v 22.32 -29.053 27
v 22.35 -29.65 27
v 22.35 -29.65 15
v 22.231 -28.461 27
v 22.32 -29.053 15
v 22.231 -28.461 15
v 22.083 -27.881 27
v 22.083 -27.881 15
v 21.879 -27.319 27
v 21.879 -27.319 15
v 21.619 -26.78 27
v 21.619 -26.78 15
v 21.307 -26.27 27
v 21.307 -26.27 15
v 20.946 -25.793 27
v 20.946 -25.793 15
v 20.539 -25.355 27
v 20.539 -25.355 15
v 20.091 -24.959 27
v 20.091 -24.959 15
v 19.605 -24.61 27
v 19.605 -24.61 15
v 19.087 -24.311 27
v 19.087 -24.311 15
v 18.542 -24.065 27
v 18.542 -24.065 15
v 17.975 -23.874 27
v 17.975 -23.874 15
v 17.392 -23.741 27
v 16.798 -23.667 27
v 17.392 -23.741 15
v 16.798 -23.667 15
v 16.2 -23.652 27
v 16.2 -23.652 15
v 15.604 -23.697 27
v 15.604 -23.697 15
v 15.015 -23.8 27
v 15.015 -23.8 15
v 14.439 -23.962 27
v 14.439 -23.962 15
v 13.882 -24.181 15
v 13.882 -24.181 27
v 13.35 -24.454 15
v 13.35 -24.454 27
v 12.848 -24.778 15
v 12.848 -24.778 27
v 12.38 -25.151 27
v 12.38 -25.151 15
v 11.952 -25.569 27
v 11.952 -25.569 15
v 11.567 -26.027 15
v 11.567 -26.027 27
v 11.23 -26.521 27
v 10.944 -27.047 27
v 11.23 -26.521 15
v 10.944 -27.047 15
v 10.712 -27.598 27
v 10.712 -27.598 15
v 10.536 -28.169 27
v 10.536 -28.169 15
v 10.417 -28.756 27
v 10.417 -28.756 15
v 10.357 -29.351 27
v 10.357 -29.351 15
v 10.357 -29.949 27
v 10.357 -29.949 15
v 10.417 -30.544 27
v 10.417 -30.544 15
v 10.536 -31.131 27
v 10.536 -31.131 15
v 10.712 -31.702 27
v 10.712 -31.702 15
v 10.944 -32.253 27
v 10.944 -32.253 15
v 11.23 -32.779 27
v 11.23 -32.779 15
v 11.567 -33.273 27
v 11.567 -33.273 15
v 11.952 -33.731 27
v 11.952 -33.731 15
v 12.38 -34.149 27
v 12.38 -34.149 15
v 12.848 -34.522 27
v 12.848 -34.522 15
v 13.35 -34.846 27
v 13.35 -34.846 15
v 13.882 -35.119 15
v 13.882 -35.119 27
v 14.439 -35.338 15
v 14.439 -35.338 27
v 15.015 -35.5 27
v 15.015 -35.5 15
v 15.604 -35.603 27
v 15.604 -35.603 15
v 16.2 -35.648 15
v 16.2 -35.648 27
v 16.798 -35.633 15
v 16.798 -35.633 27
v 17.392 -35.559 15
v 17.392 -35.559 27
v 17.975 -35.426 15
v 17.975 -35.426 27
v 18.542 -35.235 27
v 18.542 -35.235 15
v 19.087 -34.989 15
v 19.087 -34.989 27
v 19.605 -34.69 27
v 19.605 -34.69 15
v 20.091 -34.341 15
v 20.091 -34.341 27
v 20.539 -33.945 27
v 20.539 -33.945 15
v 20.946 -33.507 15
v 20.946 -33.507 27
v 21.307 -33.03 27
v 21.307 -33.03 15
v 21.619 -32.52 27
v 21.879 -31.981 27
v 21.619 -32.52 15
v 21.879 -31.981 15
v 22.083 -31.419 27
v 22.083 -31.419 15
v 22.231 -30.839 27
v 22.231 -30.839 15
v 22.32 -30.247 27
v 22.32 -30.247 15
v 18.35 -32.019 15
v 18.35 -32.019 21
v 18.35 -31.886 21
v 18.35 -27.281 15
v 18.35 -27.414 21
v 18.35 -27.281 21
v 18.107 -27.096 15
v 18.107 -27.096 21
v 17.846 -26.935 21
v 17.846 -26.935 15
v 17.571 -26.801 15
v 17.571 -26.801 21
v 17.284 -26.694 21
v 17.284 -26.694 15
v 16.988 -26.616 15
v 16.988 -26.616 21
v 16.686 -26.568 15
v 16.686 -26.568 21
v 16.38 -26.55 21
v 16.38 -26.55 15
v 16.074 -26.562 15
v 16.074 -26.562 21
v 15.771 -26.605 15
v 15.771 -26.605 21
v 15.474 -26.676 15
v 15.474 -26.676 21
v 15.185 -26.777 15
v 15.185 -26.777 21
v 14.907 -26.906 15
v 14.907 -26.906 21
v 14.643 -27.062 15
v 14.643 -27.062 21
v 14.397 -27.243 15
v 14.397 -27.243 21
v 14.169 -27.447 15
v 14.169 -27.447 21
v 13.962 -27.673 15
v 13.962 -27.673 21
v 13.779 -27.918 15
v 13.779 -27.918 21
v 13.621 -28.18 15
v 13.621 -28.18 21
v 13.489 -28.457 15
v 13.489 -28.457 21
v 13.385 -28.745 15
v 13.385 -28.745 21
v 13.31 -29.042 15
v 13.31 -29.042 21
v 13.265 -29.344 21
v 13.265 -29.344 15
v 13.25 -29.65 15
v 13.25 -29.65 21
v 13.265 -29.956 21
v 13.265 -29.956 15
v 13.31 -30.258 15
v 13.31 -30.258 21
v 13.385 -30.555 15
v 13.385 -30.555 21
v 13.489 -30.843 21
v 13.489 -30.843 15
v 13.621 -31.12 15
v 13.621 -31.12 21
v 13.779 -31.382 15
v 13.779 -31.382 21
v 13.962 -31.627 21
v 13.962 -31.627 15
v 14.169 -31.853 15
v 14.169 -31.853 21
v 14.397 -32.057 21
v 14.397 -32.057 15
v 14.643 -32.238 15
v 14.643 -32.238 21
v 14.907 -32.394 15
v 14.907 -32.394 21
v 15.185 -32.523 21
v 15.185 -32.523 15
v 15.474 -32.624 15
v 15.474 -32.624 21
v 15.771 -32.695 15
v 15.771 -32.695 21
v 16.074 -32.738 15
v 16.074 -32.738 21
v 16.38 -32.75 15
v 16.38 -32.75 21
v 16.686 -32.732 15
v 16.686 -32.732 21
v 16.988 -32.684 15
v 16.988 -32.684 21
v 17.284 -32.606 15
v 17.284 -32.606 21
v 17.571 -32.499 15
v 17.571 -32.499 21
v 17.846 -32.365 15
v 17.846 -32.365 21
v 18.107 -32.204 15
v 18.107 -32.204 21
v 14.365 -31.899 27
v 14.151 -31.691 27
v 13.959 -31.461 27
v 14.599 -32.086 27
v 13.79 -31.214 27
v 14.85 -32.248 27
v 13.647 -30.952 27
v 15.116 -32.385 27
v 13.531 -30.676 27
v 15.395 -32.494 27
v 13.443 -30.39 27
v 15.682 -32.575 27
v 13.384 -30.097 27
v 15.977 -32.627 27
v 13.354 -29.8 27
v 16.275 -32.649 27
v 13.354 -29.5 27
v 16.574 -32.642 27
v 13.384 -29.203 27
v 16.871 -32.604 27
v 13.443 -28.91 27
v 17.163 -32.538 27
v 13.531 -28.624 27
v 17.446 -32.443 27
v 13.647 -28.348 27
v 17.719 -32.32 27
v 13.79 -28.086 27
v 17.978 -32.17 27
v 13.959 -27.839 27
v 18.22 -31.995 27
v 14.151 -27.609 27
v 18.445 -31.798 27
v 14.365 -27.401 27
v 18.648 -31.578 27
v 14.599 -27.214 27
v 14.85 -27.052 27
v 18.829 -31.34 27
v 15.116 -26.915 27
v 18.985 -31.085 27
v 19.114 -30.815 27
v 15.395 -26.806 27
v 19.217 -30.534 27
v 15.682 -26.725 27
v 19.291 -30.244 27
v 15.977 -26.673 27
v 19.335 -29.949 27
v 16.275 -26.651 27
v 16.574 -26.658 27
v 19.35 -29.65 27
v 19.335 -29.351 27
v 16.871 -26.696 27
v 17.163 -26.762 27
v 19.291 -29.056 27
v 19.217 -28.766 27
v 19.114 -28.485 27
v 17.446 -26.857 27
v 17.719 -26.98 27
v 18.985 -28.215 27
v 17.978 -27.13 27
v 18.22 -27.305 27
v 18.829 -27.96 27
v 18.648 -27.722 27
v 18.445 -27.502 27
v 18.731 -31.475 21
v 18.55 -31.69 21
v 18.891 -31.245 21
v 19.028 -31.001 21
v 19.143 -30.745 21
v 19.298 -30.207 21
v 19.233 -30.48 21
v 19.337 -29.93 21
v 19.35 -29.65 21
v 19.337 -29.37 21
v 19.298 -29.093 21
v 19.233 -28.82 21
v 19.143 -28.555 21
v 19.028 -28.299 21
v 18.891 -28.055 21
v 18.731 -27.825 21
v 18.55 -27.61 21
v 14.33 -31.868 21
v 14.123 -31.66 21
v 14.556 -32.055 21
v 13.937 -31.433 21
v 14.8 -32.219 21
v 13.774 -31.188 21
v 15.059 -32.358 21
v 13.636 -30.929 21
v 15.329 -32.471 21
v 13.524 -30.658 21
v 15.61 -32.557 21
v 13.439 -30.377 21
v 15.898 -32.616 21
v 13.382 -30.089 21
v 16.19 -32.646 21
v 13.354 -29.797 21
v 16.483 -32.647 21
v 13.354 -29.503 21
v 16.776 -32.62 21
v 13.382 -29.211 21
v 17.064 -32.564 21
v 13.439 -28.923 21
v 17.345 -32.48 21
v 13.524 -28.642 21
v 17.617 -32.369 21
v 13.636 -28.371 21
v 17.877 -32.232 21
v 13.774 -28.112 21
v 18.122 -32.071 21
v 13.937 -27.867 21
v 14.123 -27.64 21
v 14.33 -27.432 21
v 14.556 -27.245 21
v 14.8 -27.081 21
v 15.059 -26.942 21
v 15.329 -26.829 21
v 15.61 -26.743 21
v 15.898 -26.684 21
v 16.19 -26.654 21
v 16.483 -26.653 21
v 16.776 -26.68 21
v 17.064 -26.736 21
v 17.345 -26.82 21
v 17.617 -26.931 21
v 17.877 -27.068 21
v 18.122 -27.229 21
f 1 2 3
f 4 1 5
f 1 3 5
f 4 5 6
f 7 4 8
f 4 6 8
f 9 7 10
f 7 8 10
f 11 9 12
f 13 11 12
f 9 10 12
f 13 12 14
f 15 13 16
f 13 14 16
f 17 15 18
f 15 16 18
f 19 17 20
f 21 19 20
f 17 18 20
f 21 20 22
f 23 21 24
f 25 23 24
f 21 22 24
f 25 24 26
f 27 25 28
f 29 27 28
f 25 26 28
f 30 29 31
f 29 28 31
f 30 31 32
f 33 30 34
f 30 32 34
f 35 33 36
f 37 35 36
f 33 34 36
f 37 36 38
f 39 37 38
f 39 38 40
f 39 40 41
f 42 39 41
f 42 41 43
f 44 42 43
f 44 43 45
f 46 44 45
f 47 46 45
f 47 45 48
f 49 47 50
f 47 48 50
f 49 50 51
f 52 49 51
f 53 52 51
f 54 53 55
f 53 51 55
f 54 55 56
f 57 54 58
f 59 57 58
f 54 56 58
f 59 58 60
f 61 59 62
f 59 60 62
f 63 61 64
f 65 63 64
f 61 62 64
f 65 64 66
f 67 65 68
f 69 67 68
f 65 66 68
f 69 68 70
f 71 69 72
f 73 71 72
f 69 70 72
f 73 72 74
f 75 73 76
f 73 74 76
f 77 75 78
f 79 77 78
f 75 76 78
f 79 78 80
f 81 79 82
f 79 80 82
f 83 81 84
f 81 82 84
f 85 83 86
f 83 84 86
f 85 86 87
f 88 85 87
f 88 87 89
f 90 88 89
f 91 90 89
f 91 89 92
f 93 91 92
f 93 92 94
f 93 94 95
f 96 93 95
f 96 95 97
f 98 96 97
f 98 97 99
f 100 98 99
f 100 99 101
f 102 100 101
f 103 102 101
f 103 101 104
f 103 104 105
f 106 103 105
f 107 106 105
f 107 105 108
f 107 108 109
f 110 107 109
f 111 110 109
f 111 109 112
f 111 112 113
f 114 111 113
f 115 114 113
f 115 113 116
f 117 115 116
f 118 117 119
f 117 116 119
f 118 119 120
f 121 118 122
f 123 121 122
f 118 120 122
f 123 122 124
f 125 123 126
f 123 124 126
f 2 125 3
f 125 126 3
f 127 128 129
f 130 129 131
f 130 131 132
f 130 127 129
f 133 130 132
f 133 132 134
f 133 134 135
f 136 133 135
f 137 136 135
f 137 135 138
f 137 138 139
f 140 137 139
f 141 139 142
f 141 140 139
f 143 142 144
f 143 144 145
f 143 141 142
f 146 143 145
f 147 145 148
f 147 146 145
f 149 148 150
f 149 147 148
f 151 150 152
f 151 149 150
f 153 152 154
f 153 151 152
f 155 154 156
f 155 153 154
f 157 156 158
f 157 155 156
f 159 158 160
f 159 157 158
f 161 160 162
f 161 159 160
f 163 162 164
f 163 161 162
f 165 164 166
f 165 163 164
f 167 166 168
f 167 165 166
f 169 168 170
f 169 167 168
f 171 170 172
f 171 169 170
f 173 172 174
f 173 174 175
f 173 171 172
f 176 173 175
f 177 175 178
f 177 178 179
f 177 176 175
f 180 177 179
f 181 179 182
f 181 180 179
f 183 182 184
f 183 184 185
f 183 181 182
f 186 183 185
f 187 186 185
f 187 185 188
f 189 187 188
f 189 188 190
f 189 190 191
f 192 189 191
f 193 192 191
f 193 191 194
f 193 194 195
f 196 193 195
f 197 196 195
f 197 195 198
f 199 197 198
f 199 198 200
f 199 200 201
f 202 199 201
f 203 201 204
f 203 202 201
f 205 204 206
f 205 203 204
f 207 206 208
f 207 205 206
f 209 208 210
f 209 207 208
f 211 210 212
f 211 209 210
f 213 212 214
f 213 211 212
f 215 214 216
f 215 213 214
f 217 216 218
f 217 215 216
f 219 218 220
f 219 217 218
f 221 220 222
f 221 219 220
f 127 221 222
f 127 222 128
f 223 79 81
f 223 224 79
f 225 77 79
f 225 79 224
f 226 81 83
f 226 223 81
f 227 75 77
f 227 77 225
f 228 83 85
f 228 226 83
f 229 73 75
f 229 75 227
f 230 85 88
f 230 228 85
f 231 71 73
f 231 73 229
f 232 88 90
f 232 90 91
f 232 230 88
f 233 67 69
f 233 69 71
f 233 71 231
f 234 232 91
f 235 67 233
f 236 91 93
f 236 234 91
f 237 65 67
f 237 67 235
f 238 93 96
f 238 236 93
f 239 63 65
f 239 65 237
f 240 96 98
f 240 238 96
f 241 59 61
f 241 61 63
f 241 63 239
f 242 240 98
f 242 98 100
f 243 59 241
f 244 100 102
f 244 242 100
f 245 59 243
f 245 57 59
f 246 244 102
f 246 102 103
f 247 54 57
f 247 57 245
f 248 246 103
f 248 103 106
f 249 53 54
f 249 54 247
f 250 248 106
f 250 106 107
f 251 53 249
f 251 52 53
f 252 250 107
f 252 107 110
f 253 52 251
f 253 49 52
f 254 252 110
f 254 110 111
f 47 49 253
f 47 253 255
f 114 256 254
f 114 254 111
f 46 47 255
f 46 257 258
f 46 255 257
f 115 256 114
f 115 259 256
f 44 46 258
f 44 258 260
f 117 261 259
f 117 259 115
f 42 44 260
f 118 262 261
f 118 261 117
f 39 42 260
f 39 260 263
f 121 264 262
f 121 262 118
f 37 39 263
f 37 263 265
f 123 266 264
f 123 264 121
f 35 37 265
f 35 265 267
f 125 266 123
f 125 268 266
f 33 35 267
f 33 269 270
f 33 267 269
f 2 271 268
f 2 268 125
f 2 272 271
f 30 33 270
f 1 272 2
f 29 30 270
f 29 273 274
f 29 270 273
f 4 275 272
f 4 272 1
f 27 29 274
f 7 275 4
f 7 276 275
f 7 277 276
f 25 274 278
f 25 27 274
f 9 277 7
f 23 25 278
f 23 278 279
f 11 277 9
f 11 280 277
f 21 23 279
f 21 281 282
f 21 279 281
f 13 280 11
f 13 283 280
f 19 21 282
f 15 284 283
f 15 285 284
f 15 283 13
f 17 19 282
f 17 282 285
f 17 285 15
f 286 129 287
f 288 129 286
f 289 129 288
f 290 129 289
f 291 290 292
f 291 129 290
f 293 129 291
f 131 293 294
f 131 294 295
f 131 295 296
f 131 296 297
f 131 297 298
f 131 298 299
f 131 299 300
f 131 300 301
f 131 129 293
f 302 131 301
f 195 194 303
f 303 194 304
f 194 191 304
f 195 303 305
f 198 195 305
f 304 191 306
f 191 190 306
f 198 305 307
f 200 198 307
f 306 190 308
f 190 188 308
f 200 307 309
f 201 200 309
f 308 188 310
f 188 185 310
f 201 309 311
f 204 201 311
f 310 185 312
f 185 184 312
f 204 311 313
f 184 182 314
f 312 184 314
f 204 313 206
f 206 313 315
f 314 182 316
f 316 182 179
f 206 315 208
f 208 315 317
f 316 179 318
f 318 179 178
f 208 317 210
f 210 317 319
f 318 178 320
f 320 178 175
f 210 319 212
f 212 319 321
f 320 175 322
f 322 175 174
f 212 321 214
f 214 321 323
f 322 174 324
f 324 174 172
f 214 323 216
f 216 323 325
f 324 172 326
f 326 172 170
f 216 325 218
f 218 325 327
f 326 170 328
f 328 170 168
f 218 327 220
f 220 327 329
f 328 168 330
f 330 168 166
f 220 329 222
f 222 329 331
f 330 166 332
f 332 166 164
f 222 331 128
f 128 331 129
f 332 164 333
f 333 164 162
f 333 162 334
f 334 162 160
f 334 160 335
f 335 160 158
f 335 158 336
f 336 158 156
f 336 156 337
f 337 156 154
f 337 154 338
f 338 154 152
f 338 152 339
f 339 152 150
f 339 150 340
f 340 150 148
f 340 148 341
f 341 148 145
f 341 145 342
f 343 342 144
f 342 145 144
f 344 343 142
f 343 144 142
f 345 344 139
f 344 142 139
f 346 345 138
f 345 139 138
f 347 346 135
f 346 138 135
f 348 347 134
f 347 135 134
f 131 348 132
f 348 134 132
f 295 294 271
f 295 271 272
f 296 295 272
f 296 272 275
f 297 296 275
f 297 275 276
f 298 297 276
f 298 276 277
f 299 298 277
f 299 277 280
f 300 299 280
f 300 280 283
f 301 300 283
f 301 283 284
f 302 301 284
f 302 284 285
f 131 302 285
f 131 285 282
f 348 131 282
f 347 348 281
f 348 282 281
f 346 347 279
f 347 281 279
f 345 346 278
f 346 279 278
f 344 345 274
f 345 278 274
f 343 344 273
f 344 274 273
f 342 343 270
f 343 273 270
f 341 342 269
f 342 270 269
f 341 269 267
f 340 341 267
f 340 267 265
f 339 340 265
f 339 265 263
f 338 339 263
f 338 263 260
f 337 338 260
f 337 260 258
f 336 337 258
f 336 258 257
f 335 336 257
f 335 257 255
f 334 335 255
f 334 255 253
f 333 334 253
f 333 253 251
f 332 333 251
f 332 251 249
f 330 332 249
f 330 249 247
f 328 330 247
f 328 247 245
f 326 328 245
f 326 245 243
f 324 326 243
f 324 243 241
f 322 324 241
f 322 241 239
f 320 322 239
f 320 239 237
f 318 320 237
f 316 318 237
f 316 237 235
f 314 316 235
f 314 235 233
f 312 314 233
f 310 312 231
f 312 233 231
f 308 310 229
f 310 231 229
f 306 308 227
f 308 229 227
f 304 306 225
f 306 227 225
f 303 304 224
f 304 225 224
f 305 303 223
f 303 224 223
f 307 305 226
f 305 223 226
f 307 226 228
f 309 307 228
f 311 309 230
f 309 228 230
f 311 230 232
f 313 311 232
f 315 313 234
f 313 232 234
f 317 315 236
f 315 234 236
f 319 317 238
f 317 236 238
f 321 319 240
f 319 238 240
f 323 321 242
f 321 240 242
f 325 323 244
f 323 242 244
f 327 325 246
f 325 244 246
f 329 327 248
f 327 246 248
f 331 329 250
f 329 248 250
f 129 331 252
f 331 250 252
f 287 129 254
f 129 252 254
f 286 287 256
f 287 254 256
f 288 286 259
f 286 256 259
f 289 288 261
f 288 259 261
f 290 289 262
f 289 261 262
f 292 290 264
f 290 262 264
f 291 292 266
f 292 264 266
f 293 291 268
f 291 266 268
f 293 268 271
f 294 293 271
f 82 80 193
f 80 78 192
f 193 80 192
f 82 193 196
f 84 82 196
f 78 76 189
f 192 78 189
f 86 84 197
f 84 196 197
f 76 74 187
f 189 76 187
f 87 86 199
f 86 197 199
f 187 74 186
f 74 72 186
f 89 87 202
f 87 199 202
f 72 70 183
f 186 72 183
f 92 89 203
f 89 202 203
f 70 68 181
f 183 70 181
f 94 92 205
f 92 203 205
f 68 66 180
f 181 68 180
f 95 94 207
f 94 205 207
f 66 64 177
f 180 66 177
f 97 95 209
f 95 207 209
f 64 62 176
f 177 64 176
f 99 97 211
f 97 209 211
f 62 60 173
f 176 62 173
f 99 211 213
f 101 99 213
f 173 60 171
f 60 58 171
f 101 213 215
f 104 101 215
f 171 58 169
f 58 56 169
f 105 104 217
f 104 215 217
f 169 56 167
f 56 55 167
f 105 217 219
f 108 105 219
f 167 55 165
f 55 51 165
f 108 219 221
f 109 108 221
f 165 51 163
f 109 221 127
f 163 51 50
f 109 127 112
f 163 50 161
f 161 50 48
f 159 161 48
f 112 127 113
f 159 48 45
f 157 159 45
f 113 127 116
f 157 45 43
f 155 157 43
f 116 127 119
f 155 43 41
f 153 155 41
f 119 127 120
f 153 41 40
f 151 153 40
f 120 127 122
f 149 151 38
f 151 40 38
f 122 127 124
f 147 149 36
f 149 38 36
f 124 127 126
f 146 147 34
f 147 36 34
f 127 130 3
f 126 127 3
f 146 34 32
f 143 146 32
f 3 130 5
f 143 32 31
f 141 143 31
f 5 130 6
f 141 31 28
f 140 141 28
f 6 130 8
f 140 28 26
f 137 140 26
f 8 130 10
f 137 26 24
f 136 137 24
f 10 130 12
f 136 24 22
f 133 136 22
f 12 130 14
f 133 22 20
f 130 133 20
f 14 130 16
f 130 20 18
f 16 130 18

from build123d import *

# Parameters (mm, degrees)
BOSS_EXTRUDE1_START = 15
SKETCH1_R           = 6
BOSS_EXTRUDE1_DEPTH = 12
CUT_EXTRUDE2_DEPTH  = 6
SKETCH2_R           = 3
CUT_EXTRUDE1_DEPTH  = 6


with BuildPart() as part:
    # Sketch1 → Boss-Extrude1 (new body)
    with BuildSketch(Plane.XY.offset(BOSS_EXTRUDE1_START)):
        with Locations((16.35, -29.65)):
            Circle(SKETCH1_R)
    extrude(amount=BOSS_EXTRUDE1_DEPTH)

    # Sketch3 → Cut-Extrude2 (cut)
    with BuildSketch(Plane(origin=(0, 0, 15), x_dir=(-1, 0, 0), z_dir=(0, 0, -1))):
        with BuildLine():
            Line((-18.35, -32.018543856), (-18.35, -27.281456144))
            ThreePointArc((-18.35, -27.281456144), (-13.25, -29.65), (-18.35, -32.018543856))
        make_face()
    extrude(amount=-CUT_EXTRUDE2_DEPTH, mode=Mode.SUBTRACT)

    # Sketch2 → Cut-Extrude1 (cut)
    with BuildSketch(Plane.XY.offset(27)):
        with Locations((16.35, -29.65)):
            Circle(SKETCH2_R)
    extrude(amount=-CUT_EXTRUDE1_DEPTH, mode=Mode.SUBTRACT)


solid = part.part
